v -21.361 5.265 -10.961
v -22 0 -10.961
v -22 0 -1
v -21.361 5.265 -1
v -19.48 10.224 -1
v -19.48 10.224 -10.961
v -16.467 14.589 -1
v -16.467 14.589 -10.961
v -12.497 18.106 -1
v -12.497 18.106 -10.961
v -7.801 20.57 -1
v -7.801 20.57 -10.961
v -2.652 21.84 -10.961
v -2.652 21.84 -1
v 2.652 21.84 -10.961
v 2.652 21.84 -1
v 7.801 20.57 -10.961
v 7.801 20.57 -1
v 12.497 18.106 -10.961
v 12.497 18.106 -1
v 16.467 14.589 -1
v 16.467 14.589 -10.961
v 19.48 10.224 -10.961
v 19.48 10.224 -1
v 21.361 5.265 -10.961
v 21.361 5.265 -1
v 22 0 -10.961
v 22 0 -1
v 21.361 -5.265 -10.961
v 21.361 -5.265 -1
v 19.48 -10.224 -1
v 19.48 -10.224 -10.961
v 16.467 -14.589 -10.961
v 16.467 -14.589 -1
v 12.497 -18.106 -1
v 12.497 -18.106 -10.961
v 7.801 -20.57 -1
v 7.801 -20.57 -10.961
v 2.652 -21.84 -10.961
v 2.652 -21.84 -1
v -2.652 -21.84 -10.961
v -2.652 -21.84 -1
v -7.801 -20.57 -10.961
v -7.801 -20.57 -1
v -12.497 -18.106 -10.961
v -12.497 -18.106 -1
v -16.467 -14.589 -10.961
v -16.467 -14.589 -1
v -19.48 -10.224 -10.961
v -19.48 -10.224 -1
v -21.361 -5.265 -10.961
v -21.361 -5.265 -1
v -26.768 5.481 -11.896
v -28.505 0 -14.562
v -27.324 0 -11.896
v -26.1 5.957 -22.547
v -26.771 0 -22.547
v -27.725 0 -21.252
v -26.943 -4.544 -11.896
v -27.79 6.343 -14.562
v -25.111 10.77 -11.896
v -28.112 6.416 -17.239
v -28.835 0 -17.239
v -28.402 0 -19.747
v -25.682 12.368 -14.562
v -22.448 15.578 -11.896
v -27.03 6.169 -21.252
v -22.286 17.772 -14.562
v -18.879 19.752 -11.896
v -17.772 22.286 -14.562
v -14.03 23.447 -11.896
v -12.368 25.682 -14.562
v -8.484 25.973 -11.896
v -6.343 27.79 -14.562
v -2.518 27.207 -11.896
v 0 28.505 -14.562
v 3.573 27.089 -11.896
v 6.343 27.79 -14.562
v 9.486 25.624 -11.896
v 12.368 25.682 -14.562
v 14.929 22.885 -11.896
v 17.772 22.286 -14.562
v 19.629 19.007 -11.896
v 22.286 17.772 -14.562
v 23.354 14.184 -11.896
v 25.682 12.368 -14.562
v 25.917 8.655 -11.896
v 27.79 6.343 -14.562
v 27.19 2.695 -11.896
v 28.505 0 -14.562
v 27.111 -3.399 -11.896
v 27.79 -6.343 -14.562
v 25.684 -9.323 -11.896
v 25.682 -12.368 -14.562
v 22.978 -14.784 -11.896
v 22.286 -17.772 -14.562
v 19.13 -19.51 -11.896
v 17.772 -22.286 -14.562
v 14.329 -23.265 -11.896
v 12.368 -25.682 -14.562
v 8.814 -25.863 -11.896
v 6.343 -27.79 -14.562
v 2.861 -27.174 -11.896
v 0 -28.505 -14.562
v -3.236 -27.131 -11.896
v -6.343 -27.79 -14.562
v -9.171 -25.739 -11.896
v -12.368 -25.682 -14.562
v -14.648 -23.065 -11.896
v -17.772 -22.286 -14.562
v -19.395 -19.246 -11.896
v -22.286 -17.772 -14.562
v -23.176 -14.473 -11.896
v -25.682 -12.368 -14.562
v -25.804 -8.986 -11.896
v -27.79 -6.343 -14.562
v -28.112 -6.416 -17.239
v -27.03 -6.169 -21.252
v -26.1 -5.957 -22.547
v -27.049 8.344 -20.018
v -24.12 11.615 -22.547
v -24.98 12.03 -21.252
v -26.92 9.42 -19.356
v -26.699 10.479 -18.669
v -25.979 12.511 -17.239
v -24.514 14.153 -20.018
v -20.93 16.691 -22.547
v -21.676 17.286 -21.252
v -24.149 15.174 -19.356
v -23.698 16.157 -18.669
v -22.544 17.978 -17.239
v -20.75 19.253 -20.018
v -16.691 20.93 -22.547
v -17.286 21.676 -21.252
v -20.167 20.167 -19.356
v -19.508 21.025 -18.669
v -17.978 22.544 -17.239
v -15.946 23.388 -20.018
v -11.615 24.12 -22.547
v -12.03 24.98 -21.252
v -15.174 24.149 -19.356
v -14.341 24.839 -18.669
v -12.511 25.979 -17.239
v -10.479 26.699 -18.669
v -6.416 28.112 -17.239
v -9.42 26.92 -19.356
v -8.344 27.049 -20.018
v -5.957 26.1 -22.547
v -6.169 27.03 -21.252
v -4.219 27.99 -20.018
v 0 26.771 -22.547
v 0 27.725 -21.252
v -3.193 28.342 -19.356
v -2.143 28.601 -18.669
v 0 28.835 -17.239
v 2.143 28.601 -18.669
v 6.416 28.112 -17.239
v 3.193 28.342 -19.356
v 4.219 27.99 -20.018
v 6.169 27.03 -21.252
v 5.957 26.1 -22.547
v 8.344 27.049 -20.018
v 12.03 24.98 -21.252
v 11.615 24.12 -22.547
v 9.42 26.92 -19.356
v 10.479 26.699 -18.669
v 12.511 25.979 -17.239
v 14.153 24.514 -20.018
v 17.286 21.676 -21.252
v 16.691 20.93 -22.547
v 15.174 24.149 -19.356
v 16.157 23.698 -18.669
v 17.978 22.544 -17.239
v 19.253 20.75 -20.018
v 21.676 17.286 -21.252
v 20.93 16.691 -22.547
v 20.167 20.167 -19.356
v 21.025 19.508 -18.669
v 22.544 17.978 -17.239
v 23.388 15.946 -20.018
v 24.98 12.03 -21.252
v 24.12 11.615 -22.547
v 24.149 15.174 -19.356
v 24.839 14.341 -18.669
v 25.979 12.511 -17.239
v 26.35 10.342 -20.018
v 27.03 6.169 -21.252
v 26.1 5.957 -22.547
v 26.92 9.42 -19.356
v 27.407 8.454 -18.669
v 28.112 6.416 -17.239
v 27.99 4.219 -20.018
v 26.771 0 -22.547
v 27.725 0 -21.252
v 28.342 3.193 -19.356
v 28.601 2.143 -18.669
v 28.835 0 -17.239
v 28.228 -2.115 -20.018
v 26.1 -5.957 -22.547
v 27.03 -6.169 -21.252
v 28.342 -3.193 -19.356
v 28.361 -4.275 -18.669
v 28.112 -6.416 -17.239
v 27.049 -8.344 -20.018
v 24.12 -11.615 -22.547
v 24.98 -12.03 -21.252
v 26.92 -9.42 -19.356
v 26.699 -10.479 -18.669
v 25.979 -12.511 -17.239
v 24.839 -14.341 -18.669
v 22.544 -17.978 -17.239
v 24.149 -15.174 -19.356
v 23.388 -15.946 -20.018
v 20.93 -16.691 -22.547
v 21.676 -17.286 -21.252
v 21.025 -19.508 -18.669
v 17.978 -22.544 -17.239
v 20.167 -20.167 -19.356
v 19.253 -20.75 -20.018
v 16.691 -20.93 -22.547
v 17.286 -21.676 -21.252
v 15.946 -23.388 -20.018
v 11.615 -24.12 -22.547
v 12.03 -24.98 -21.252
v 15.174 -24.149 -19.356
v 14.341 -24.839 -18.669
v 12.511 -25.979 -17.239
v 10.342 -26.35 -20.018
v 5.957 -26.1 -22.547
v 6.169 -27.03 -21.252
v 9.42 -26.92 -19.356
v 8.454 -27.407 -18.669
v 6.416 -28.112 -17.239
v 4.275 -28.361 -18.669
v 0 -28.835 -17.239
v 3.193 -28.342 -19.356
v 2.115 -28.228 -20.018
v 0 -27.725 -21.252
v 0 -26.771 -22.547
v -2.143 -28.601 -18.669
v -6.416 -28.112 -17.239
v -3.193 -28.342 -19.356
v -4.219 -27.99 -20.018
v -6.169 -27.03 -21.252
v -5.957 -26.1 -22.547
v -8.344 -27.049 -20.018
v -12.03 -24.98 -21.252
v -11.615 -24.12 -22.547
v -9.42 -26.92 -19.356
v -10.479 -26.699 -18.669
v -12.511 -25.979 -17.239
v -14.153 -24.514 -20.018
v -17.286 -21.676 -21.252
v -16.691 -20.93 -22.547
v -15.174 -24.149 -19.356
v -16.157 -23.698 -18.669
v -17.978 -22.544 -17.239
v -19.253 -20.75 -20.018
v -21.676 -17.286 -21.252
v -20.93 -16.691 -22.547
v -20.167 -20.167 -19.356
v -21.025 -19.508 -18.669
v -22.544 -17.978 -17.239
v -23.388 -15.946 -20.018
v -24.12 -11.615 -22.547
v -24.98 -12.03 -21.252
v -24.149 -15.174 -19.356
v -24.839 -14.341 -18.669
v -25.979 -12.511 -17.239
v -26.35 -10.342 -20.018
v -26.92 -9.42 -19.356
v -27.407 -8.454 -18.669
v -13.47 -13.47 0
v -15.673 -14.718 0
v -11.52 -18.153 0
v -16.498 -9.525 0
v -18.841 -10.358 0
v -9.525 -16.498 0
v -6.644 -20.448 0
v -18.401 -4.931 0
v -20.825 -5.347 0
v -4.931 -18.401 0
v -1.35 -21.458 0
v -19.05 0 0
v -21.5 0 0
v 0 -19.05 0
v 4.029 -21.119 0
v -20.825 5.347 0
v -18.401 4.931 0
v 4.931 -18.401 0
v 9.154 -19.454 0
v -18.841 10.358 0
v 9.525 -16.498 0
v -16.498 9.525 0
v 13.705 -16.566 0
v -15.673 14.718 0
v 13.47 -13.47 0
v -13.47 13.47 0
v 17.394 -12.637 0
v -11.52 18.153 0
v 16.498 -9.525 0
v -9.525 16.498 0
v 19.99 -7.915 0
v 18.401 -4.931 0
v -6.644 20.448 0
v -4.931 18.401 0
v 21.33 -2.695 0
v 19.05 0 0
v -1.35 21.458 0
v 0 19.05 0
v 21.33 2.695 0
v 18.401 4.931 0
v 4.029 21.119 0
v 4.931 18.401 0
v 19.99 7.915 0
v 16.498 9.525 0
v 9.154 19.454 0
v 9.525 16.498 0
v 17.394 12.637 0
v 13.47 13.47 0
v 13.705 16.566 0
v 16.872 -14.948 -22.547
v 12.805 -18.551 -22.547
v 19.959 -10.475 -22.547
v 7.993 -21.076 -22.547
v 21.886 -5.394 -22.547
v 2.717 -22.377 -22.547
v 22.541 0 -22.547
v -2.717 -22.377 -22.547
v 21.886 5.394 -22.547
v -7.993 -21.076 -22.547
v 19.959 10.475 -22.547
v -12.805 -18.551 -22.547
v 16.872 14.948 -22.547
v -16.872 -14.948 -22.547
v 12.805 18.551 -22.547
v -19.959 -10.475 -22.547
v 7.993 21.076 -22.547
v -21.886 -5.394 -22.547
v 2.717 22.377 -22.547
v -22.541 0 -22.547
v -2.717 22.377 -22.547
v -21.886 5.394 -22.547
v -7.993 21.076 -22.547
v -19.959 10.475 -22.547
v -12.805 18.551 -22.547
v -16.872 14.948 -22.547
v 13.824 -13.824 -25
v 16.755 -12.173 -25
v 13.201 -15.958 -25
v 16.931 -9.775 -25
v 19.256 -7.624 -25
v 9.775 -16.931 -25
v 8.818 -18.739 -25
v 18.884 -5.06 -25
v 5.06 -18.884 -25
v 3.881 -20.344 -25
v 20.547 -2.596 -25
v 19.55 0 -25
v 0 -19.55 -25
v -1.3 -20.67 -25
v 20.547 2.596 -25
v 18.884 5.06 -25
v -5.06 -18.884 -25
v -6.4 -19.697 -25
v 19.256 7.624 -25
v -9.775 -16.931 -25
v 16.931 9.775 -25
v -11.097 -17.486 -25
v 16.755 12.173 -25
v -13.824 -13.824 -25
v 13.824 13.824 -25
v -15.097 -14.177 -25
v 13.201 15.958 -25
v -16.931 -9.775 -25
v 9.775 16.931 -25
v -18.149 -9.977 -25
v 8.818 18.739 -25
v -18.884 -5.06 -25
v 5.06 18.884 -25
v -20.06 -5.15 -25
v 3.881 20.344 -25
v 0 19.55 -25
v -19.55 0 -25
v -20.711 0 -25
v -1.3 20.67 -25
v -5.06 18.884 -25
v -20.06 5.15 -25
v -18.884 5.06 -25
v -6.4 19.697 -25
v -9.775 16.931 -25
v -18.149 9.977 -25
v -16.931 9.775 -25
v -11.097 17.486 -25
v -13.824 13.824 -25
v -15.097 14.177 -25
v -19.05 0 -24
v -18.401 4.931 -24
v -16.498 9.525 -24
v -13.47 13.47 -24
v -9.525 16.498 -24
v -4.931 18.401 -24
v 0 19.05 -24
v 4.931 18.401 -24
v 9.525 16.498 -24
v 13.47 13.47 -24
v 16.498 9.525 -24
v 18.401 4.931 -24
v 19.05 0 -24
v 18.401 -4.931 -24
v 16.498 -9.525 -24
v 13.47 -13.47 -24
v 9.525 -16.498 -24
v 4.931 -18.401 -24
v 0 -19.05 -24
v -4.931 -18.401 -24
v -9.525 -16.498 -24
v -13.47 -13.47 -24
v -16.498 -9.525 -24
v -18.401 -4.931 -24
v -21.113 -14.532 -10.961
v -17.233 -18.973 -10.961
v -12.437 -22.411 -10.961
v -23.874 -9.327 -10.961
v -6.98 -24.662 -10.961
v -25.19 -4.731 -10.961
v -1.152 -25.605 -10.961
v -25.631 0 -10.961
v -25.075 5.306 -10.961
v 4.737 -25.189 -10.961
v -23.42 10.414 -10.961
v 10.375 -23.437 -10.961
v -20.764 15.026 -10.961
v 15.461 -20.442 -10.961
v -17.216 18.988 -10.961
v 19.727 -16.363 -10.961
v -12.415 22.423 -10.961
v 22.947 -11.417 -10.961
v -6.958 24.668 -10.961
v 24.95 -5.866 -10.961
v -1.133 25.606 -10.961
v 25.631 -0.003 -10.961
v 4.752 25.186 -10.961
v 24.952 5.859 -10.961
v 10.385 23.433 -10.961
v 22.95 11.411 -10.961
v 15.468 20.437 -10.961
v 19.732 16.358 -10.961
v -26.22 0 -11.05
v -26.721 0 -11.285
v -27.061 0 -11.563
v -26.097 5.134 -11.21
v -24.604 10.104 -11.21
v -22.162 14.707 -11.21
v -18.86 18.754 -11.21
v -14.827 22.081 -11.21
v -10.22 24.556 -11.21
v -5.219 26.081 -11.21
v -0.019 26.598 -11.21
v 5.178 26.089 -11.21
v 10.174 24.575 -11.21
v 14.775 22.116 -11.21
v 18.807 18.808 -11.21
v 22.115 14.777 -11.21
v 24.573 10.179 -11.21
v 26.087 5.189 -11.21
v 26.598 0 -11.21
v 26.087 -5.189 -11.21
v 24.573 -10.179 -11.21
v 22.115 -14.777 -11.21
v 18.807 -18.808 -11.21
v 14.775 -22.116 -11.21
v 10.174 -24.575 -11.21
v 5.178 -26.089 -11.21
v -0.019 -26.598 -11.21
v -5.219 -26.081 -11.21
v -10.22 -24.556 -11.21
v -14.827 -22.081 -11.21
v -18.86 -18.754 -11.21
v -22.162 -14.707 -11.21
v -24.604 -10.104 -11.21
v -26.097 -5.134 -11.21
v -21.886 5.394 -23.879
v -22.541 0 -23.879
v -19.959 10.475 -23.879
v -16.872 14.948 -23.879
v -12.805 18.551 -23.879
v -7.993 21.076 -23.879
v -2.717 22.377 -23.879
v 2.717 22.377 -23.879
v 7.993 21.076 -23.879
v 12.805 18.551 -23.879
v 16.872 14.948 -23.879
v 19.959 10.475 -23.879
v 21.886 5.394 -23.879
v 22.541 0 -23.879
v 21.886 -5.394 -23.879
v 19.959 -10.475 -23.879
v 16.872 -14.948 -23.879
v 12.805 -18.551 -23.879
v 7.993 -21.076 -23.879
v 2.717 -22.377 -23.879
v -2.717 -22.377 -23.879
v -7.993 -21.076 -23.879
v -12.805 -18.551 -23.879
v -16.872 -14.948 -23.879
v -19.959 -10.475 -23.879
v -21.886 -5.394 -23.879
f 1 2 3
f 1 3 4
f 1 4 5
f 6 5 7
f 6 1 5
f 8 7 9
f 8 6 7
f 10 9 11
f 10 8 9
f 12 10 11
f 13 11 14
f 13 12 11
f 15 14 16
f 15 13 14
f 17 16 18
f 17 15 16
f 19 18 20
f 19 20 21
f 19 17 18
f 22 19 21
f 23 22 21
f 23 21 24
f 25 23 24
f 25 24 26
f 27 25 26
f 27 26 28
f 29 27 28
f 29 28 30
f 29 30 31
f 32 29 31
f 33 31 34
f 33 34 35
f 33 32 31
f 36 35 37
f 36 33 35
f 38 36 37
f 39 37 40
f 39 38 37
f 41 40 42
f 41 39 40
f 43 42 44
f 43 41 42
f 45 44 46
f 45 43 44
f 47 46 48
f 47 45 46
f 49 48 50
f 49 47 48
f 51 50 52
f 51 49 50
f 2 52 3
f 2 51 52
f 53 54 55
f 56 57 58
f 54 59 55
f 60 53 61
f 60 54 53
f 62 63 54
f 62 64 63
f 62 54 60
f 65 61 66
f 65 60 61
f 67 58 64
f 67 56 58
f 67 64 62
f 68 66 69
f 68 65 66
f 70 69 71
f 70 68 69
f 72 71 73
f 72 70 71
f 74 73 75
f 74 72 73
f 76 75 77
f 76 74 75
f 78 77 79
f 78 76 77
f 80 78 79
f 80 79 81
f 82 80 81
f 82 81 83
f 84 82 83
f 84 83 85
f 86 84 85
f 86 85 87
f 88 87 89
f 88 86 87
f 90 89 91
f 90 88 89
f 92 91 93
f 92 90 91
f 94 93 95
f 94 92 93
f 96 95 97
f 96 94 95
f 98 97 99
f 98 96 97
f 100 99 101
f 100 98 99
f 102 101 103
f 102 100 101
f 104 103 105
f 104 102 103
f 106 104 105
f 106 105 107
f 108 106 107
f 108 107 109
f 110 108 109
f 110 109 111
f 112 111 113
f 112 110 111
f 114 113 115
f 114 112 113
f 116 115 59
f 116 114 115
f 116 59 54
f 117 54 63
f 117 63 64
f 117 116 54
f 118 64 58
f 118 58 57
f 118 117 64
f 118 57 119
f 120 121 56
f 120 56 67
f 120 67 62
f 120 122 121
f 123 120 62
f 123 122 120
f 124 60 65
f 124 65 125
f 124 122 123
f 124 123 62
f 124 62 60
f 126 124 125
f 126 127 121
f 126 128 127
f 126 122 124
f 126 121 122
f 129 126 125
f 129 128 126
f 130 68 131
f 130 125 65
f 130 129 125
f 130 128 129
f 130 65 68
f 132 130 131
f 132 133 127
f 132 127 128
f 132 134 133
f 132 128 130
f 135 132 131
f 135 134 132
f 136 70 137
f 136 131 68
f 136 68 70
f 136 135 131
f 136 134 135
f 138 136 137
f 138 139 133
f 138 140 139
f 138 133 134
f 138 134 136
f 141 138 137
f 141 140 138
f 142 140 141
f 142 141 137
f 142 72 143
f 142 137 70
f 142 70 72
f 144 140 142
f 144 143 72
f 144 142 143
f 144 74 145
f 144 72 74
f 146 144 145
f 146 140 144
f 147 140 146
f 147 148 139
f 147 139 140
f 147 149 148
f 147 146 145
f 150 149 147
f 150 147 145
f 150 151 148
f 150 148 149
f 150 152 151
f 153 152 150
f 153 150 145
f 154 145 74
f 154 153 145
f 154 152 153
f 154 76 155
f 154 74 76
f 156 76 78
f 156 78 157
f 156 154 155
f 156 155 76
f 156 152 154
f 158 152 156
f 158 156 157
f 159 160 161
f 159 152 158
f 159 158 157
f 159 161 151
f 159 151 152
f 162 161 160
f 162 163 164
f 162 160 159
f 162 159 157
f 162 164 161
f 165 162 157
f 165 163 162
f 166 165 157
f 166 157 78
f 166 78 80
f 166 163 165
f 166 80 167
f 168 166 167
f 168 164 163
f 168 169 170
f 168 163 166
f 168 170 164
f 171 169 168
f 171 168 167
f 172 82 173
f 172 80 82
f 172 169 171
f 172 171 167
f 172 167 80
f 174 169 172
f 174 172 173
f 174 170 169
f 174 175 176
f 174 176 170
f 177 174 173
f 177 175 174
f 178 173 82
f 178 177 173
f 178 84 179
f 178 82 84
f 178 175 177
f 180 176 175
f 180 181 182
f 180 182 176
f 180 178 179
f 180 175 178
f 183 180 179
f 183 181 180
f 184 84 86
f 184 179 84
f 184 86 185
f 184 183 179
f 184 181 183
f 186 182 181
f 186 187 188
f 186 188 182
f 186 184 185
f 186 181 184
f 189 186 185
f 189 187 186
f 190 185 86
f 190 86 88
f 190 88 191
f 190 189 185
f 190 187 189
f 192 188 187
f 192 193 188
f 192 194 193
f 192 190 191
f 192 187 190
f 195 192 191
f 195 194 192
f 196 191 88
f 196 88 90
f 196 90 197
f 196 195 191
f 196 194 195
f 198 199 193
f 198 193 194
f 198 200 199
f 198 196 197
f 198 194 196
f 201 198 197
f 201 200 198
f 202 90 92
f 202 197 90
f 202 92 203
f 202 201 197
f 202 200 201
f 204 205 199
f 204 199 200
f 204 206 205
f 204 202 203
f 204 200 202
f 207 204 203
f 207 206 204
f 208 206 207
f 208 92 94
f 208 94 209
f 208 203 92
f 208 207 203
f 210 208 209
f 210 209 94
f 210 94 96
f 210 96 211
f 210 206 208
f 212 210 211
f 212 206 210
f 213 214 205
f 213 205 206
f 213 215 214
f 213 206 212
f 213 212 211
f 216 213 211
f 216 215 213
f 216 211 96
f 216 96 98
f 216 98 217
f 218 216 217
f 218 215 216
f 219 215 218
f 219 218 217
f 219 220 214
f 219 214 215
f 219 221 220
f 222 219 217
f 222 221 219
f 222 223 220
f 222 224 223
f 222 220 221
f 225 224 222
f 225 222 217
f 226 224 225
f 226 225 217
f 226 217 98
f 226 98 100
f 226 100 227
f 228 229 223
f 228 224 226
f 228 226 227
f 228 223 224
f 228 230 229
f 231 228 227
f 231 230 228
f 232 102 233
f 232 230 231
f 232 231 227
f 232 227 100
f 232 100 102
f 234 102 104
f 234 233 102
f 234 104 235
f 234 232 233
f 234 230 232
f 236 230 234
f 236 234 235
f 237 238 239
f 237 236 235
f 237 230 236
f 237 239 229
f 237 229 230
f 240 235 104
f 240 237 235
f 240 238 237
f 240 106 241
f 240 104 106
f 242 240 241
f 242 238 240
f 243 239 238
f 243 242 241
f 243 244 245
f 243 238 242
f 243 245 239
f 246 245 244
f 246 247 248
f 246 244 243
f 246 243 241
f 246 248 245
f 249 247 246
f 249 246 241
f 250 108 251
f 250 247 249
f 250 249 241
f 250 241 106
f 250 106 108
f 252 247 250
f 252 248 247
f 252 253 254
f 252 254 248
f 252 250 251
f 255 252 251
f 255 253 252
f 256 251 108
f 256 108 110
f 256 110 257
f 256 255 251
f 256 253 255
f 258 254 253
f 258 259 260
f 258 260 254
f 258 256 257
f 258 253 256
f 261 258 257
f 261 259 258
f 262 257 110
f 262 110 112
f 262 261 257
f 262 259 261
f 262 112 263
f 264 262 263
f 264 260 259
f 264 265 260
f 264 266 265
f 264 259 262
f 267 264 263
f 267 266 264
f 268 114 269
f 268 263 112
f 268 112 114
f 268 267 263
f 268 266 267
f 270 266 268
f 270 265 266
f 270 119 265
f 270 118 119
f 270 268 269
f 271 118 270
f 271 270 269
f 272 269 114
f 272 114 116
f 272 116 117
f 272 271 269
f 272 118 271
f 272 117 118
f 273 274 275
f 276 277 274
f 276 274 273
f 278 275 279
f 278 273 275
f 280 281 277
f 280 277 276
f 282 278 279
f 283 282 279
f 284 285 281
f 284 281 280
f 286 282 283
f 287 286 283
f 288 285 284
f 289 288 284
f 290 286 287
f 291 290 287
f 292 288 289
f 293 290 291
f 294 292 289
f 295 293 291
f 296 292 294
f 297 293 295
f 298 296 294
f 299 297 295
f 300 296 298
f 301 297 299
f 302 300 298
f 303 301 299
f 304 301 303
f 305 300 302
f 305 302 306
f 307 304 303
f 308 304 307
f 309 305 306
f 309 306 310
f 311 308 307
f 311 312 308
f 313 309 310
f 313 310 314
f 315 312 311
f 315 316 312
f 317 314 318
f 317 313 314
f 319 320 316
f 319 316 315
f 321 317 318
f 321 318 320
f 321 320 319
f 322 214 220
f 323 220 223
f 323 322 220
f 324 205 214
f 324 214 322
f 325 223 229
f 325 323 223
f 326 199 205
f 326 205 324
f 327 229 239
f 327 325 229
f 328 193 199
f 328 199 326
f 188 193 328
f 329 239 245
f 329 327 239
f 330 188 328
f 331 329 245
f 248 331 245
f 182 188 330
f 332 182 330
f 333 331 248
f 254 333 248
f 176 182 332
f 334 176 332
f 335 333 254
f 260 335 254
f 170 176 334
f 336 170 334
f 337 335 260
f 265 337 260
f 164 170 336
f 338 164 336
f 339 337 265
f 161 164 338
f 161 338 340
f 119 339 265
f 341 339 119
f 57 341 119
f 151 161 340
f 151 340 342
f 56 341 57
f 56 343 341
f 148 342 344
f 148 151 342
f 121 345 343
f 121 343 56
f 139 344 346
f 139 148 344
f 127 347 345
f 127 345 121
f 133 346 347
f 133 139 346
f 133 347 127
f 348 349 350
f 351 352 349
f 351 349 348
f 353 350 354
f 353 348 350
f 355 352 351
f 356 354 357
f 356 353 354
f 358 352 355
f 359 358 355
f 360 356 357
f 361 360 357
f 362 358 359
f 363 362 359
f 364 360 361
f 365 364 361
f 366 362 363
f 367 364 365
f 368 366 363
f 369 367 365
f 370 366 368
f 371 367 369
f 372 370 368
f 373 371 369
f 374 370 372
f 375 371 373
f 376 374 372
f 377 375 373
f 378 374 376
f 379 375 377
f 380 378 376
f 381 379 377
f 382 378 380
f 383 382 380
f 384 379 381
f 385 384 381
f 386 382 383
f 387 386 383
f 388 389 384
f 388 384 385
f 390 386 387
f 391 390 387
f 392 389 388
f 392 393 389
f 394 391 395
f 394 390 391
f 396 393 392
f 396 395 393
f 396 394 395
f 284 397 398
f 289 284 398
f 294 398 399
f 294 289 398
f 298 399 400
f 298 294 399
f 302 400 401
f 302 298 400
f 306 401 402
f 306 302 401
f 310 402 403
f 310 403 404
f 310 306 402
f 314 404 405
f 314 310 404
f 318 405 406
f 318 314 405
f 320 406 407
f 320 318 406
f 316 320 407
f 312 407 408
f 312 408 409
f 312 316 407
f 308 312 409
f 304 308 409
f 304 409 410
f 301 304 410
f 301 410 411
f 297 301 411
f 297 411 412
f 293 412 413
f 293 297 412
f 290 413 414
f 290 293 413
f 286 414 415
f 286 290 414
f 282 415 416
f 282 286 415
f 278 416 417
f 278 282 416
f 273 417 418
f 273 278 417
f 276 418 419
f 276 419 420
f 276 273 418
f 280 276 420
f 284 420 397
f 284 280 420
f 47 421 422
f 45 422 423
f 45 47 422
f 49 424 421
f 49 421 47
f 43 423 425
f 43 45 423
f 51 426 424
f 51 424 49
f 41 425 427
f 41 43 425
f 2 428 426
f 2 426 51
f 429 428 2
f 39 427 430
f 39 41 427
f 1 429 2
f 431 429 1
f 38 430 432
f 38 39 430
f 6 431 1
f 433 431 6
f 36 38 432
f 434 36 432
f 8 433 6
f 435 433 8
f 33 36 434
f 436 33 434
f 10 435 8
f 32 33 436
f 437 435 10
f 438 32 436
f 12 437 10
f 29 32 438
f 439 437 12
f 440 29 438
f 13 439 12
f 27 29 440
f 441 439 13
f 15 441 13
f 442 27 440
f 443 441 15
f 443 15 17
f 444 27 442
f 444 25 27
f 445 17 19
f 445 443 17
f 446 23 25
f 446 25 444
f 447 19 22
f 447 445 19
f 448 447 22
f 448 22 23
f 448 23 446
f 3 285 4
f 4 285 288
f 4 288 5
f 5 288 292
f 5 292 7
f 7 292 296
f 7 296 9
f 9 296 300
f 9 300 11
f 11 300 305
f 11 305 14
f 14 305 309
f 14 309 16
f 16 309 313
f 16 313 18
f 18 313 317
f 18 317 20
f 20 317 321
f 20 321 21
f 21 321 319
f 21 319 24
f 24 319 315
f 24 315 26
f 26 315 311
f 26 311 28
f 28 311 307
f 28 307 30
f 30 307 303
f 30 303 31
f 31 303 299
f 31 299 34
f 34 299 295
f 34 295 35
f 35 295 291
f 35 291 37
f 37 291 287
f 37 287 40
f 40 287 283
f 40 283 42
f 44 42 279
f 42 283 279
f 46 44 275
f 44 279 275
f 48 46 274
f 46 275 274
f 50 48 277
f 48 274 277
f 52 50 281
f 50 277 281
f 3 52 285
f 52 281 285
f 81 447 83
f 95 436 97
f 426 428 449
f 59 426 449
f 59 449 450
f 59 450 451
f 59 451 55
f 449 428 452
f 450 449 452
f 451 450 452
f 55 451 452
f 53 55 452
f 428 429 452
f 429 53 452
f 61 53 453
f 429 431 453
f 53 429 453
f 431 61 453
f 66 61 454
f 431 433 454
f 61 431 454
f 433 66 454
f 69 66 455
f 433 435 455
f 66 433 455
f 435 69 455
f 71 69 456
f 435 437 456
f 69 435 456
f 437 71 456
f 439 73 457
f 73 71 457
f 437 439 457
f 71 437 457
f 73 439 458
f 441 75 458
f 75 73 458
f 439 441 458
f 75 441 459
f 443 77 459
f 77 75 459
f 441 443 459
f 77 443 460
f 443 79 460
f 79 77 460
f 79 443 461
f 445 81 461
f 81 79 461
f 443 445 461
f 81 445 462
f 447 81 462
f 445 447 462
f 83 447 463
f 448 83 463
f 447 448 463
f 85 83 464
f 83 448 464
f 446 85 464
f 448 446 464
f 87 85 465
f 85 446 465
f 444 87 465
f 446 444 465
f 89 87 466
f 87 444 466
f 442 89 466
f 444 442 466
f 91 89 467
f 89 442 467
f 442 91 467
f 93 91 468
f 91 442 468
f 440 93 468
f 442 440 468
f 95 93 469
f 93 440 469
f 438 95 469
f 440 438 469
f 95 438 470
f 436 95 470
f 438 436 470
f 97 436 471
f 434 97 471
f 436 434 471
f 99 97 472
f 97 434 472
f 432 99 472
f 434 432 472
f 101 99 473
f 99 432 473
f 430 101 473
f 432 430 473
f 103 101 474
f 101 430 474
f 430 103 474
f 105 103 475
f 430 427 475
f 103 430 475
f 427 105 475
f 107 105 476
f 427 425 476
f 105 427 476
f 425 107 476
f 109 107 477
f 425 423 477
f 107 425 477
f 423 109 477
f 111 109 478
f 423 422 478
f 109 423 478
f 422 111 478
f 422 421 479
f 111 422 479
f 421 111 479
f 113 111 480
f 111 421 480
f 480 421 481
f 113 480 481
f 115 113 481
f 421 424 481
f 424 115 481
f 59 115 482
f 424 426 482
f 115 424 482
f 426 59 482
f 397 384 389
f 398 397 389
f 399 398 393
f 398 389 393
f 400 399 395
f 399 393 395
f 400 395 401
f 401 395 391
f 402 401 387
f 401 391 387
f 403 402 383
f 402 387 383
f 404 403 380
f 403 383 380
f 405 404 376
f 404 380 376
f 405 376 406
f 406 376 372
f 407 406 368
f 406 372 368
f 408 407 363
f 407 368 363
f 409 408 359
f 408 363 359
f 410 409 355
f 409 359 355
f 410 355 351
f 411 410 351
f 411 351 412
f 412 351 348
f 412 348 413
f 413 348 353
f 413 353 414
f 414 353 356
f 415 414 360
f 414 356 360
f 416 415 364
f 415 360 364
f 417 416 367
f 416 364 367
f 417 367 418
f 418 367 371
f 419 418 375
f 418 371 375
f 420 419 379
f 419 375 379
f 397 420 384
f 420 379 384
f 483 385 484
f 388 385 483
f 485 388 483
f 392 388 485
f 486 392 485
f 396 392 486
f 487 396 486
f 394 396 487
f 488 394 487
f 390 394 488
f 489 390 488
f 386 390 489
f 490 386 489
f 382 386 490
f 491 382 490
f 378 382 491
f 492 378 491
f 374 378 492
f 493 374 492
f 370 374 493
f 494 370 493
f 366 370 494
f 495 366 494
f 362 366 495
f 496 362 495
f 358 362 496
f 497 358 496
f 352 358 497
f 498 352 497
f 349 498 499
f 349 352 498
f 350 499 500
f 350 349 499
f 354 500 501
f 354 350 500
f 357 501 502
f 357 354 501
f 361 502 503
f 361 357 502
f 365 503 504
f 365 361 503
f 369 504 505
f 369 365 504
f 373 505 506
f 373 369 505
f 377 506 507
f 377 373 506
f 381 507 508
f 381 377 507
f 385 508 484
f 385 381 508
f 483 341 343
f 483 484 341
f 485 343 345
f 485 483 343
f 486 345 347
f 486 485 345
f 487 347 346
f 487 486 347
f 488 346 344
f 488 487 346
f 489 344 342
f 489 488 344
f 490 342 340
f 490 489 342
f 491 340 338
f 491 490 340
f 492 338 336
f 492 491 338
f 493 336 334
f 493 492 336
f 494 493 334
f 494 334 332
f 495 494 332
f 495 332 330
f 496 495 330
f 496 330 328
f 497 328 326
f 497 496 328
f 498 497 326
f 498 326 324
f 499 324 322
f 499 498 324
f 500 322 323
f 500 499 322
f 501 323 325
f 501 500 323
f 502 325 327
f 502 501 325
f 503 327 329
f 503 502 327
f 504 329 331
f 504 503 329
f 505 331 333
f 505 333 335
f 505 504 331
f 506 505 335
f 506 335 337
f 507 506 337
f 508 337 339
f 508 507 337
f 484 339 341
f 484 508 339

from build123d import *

# Parameters (mm, degrees)
F2_R       = 2
F3_SIZE2   = 0.5
F3_SIZE    = 1
F3_2_SIZE2 = 0.5
F3_2_SIZE  = 1


with BuildPart() as f1:
    # F0 (on Front) → F1 (revolve)
    with BuildSketch(Plane.XZ):
        with BuildLine():
            Line((-19.05, 0), (-22, 0))
            Line((-22, 0), (-22, -10.9611023217))
            Line((-22, -10.9611023217), (-26.6634617001, -10.9611023217))
            add(Edge.make_bspline(
                [(-26.6634617001, -10.9611023217), (-29.7804344445, -14.9203110486), (-29.3020680547, -19.812868908), (-26.7707351595, -22.5467085838)],
                knots=[0, 0, 0, 0, 11.5861028847, 11.5861028847, 11.5861028847, 11.5861028847], degree=3))
            Line((-26.7707351595, -22.5467085838), (-22.5411150604, -22.5467085838))
            Line((-22.5411150604, -22.5467085838), (-22.5411150604, -23.8788612187))
            Line((-22.5411150604, -23.8788612187), (-20.7105297595, -25))
            Line((-20.7105297595, -25), (-19.05, -25))
            Line((-19.05, -25), (-19.05, 0))
        make_face()
    revolve(axis=Axis((0, 0, -12.5), (0, 0, -1)))

    # F2
    f2_edges = [f1.edges().sort_by_distance(p)[0] for p in [
        (26.663462, 0, -10.961102),
    ]]
    fillet(f2_edges, radius=F2_R)

    # F3
    f3_edges = [f1.edges().sort_by_distance(p)[0] for p in [
        (19.05, 0, -25),
    ]]
    f3_side = f1.faces().sort_by_distance((19.05, 0, -12.5))[0]
    chamfer(f3_edges, length=F3_SIZE, length2=F3_SIZE2, reference=f3_side)

    # F3#2
    f3_2_edges = [f1.edges().sort_by_distance(p)[0] for p in [
        (22, 0, 0),
    ]]
    f3_2_side = f1.faces().sort_by_distance((22, 0, -5.480551))[0]
    chamfer(f3_2_edges, length=F3_2_SIZE, length2=F3_2_SIZE2, reference=f3_2_side)


solid = f1.part
